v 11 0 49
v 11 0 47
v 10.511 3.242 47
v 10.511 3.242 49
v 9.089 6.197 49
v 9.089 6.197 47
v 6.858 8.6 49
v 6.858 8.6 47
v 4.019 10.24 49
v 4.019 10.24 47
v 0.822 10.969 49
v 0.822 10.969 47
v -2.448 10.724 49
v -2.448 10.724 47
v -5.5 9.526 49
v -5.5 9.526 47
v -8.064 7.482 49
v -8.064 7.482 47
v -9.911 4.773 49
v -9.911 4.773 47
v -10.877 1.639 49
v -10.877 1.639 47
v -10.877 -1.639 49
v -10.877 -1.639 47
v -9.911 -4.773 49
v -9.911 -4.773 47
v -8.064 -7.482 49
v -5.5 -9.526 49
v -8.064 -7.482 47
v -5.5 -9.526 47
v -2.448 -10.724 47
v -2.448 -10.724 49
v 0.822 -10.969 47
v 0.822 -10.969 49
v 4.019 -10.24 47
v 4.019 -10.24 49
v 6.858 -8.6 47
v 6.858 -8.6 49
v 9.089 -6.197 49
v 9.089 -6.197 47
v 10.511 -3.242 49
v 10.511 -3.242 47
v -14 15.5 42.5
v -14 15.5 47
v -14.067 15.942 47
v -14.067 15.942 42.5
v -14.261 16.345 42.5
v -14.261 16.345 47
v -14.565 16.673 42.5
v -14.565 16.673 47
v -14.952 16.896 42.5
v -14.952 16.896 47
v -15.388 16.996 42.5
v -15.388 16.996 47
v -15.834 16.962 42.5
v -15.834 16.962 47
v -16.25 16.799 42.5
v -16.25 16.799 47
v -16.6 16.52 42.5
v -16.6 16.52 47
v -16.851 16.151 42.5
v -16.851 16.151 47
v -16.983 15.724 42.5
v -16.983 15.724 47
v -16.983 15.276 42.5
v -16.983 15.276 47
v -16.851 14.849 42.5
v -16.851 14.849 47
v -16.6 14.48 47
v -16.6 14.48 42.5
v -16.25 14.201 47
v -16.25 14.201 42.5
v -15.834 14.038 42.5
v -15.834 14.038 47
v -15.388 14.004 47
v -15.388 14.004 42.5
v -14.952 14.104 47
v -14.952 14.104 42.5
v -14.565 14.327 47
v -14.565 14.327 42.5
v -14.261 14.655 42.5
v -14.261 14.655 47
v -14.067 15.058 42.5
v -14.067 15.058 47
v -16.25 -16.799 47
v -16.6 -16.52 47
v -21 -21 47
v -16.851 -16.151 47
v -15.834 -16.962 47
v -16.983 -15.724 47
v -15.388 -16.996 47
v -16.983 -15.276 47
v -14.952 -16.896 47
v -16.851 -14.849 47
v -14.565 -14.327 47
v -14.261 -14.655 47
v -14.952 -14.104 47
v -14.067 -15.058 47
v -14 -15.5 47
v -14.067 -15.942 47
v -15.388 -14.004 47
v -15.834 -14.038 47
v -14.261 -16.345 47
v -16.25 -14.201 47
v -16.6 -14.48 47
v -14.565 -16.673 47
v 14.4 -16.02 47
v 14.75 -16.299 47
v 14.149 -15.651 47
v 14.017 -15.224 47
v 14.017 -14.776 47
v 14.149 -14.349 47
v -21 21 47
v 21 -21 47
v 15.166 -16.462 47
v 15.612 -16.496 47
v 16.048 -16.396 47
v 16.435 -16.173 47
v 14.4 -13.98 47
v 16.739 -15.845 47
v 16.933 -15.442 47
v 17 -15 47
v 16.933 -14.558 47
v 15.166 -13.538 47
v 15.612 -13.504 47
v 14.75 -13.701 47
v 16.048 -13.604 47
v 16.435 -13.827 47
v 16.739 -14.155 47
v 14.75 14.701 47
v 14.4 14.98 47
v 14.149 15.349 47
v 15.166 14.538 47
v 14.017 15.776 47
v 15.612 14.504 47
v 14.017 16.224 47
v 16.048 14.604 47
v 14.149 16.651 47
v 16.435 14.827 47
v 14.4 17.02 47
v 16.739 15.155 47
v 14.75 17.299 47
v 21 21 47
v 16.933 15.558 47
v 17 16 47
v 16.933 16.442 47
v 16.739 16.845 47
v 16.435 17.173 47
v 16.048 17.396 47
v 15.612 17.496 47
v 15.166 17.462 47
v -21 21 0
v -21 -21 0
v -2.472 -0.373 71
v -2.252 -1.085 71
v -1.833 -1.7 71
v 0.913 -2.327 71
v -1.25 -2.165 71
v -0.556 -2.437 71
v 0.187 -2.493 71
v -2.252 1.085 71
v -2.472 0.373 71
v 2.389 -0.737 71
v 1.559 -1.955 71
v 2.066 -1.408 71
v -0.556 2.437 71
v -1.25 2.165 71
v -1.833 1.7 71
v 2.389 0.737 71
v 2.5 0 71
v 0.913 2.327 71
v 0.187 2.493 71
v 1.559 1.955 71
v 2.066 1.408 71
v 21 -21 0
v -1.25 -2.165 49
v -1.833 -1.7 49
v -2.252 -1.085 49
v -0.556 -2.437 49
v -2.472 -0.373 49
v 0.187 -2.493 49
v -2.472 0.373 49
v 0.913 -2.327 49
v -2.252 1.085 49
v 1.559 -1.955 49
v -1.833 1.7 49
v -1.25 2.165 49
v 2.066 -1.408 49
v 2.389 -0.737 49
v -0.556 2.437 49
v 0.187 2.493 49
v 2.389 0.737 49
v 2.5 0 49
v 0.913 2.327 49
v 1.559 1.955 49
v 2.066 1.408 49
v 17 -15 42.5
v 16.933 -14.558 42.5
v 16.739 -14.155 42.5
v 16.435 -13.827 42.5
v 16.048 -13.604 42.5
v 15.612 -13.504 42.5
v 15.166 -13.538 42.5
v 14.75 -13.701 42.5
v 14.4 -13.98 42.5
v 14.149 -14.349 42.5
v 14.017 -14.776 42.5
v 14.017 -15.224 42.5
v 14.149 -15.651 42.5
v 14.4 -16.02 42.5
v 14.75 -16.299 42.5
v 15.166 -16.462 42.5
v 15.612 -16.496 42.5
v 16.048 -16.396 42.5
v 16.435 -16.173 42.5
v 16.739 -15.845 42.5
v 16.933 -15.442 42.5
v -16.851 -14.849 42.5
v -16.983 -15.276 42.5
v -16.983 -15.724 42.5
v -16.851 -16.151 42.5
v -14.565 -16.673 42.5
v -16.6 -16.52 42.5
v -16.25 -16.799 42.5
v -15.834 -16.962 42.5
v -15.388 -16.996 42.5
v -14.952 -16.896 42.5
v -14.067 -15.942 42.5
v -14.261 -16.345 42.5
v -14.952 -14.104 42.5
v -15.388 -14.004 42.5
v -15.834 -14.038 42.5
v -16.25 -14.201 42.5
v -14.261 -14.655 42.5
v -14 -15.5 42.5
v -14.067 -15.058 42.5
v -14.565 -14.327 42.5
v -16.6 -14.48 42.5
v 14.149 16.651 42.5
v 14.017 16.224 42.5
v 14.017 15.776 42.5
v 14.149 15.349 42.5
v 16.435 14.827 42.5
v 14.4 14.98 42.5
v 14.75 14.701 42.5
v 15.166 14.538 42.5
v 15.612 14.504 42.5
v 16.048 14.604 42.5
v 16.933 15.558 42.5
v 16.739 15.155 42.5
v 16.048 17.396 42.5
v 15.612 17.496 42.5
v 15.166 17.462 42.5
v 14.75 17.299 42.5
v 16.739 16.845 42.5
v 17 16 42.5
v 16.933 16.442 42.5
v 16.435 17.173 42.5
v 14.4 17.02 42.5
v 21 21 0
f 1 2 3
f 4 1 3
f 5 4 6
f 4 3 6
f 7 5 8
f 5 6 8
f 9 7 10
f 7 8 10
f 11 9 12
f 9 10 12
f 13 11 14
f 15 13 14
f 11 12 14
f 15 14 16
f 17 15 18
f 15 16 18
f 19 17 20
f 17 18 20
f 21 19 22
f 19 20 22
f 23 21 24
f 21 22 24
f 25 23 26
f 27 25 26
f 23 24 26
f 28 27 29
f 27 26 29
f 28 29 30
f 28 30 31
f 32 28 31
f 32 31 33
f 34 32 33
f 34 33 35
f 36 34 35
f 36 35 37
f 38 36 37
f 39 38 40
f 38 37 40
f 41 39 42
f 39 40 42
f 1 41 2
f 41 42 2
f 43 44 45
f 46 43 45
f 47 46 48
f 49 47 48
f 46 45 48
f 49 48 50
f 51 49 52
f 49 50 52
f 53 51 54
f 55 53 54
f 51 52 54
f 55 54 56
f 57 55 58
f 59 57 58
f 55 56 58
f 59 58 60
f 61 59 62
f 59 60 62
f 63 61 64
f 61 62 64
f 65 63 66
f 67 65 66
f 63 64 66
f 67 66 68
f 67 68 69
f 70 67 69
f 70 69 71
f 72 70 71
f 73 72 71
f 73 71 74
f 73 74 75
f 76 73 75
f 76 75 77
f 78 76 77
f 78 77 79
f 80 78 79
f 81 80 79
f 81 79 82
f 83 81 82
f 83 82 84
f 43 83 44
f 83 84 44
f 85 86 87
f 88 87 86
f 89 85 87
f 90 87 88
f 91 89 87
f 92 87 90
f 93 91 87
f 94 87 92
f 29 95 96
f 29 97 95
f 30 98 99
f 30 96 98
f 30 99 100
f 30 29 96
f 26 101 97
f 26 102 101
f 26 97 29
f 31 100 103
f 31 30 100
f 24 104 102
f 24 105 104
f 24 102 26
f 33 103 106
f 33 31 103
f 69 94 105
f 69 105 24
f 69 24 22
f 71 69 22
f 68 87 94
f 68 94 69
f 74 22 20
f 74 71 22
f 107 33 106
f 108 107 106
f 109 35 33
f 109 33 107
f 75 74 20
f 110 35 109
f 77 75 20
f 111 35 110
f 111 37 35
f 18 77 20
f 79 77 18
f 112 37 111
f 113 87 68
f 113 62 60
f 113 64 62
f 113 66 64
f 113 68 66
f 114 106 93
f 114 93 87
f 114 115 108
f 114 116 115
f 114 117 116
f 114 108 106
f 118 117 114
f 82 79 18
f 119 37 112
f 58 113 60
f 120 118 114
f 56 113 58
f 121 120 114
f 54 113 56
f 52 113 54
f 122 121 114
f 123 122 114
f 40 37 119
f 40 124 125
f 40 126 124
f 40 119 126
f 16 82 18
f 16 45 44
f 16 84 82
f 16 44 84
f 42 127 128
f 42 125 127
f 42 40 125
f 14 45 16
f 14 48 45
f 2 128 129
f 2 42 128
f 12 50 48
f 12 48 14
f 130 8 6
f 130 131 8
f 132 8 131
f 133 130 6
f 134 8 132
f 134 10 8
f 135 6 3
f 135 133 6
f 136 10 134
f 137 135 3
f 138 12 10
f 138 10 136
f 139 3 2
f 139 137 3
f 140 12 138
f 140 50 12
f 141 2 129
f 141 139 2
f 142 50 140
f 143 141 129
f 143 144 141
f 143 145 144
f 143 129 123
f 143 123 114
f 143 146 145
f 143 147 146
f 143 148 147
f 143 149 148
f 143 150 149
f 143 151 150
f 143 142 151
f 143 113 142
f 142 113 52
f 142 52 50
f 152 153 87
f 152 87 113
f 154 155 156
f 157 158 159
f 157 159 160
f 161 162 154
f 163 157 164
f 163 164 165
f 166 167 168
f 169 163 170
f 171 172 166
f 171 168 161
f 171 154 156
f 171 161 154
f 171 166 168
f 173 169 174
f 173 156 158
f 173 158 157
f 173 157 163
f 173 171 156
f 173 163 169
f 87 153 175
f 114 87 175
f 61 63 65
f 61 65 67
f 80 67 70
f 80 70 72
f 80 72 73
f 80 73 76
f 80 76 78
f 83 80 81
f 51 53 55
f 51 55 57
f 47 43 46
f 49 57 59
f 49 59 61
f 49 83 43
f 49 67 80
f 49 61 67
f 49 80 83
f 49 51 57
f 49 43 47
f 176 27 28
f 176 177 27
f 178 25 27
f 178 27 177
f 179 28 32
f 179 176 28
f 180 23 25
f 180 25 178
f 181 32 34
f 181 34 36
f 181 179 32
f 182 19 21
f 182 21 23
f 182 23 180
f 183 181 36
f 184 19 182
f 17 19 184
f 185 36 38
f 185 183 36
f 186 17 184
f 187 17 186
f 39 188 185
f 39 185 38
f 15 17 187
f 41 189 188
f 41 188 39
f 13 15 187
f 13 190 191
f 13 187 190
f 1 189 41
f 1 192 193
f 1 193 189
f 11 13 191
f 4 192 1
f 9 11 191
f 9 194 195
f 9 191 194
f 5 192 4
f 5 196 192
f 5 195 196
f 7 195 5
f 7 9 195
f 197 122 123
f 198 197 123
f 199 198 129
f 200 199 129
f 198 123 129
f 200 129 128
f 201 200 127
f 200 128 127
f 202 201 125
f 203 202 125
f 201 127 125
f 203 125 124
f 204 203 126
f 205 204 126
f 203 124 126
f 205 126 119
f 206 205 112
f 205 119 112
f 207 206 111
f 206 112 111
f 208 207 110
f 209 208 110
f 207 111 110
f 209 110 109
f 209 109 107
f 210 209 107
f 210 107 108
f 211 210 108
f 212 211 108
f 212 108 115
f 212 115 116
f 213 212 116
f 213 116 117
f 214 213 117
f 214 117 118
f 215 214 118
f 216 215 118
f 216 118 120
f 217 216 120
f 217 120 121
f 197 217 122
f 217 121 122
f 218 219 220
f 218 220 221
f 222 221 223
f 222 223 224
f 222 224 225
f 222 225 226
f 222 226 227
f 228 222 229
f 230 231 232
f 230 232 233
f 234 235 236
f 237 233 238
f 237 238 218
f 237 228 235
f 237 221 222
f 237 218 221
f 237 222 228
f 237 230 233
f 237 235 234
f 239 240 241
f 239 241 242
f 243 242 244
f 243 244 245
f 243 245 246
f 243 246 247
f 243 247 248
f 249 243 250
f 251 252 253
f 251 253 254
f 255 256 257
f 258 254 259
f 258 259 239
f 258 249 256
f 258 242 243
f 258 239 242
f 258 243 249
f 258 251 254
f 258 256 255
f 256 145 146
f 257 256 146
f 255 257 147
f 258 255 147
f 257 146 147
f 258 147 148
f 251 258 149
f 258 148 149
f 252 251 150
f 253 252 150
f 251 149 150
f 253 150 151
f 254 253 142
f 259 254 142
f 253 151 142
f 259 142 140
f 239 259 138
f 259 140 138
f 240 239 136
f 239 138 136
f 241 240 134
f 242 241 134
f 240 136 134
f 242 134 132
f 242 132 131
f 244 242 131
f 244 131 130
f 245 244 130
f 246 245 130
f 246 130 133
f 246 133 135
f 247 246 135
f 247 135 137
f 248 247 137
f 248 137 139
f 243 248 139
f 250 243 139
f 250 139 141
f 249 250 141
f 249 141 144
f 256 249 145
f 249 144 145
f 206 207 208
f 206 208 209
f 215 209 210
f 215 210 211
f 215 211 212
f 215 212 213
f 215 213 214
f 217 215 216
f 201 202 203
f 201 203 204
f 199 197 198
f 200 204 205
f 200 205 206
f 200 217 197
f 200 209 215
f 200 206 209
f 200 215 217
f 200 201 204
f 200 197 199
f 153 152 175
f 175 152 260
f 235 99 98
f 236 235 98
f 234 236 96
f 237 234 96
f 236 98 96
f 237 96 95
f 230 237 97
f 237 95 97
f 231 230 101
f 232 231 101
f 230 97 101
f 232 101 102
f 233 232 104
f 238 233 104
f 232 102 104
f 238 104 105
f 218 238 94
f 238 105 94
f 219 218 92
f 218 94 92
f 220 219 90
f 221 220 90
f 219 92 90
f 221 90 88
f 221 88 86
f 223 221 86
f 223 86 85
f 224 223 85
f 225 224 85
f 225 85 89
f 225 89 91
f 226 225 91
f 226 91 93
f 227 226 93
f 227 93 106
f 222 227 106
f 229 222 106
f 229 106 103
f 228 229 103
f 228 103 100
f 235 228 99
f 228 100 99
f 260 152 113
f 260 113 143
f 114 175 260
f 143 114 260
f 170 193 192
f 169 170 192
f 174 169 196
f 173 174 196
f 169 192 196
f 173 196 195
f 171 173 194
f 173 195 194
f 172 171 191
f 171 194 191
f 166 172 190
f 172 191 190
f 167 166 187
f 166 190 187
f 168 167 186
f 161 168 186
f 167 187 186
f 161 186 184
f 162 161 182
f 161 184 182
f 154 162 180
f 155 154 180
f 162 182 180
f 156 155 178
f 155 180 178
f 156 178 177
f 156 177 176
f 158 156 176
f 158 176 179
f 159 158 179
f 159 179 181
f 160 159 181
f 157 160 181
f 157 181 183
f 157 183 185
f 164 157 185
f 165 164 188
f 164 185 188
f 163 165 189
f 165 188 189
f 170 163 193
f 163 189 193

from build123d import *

# Parameters (mm, degrees)
SKETCH_W     = 42
SKETCH_H     = 42
PAD_DEPTH    = 47
SKETCH001_R  = 1.5
POCKET_DEPTH = 4.5
SKETCH002_R  = 11
PAD001_DEPTH = 2
SKETCH003_R  = 2.5
PAD002_DEPTH = 22


with BuildPart() as part:
    # Sketch → Pad (new body)
    with BuildSketch(Plane.XY):
        Rectangle(SKETCH_W, SKETCH_H)
    extrude(amount=PAD_DEPTH)

    # Sketch001 (on Face6 of Pad) → Pocket (cut)
    with BuildSketch(Plane.XY.offset(47)):
        with Locations((-15.5, 15.5)):
            Circle(SKETCH001_R)
        with Locations((15.5, 16)):
            Circle(SKETCH001_R)
        with Locations((15.5, -15)):
            Circle(SKETCH001_R)
        with Locations((-15.5, -15.5)):
            Circle(SKETCH001_R)
    extrude(amount=-POCKET_DEPTH, mode=Mode.SUBTRACT)

    # Sketch002 (on Face5 of Pocket) → Pad001 (join)
    with BuildSketch(Plane.XY.offset(47)):
        Circle(SKETCH002_R)
    extrude(amount=PAD001_DEPTH)

    # Sketch003 (on Face13 of Pad001) → Pad002 (join)
    with BuildSketch(Plane.XY.offset(49)):
        Circle(SKETCH003_R)
    extrude(amount=PAD002_DEPTH)


solid = part.part
